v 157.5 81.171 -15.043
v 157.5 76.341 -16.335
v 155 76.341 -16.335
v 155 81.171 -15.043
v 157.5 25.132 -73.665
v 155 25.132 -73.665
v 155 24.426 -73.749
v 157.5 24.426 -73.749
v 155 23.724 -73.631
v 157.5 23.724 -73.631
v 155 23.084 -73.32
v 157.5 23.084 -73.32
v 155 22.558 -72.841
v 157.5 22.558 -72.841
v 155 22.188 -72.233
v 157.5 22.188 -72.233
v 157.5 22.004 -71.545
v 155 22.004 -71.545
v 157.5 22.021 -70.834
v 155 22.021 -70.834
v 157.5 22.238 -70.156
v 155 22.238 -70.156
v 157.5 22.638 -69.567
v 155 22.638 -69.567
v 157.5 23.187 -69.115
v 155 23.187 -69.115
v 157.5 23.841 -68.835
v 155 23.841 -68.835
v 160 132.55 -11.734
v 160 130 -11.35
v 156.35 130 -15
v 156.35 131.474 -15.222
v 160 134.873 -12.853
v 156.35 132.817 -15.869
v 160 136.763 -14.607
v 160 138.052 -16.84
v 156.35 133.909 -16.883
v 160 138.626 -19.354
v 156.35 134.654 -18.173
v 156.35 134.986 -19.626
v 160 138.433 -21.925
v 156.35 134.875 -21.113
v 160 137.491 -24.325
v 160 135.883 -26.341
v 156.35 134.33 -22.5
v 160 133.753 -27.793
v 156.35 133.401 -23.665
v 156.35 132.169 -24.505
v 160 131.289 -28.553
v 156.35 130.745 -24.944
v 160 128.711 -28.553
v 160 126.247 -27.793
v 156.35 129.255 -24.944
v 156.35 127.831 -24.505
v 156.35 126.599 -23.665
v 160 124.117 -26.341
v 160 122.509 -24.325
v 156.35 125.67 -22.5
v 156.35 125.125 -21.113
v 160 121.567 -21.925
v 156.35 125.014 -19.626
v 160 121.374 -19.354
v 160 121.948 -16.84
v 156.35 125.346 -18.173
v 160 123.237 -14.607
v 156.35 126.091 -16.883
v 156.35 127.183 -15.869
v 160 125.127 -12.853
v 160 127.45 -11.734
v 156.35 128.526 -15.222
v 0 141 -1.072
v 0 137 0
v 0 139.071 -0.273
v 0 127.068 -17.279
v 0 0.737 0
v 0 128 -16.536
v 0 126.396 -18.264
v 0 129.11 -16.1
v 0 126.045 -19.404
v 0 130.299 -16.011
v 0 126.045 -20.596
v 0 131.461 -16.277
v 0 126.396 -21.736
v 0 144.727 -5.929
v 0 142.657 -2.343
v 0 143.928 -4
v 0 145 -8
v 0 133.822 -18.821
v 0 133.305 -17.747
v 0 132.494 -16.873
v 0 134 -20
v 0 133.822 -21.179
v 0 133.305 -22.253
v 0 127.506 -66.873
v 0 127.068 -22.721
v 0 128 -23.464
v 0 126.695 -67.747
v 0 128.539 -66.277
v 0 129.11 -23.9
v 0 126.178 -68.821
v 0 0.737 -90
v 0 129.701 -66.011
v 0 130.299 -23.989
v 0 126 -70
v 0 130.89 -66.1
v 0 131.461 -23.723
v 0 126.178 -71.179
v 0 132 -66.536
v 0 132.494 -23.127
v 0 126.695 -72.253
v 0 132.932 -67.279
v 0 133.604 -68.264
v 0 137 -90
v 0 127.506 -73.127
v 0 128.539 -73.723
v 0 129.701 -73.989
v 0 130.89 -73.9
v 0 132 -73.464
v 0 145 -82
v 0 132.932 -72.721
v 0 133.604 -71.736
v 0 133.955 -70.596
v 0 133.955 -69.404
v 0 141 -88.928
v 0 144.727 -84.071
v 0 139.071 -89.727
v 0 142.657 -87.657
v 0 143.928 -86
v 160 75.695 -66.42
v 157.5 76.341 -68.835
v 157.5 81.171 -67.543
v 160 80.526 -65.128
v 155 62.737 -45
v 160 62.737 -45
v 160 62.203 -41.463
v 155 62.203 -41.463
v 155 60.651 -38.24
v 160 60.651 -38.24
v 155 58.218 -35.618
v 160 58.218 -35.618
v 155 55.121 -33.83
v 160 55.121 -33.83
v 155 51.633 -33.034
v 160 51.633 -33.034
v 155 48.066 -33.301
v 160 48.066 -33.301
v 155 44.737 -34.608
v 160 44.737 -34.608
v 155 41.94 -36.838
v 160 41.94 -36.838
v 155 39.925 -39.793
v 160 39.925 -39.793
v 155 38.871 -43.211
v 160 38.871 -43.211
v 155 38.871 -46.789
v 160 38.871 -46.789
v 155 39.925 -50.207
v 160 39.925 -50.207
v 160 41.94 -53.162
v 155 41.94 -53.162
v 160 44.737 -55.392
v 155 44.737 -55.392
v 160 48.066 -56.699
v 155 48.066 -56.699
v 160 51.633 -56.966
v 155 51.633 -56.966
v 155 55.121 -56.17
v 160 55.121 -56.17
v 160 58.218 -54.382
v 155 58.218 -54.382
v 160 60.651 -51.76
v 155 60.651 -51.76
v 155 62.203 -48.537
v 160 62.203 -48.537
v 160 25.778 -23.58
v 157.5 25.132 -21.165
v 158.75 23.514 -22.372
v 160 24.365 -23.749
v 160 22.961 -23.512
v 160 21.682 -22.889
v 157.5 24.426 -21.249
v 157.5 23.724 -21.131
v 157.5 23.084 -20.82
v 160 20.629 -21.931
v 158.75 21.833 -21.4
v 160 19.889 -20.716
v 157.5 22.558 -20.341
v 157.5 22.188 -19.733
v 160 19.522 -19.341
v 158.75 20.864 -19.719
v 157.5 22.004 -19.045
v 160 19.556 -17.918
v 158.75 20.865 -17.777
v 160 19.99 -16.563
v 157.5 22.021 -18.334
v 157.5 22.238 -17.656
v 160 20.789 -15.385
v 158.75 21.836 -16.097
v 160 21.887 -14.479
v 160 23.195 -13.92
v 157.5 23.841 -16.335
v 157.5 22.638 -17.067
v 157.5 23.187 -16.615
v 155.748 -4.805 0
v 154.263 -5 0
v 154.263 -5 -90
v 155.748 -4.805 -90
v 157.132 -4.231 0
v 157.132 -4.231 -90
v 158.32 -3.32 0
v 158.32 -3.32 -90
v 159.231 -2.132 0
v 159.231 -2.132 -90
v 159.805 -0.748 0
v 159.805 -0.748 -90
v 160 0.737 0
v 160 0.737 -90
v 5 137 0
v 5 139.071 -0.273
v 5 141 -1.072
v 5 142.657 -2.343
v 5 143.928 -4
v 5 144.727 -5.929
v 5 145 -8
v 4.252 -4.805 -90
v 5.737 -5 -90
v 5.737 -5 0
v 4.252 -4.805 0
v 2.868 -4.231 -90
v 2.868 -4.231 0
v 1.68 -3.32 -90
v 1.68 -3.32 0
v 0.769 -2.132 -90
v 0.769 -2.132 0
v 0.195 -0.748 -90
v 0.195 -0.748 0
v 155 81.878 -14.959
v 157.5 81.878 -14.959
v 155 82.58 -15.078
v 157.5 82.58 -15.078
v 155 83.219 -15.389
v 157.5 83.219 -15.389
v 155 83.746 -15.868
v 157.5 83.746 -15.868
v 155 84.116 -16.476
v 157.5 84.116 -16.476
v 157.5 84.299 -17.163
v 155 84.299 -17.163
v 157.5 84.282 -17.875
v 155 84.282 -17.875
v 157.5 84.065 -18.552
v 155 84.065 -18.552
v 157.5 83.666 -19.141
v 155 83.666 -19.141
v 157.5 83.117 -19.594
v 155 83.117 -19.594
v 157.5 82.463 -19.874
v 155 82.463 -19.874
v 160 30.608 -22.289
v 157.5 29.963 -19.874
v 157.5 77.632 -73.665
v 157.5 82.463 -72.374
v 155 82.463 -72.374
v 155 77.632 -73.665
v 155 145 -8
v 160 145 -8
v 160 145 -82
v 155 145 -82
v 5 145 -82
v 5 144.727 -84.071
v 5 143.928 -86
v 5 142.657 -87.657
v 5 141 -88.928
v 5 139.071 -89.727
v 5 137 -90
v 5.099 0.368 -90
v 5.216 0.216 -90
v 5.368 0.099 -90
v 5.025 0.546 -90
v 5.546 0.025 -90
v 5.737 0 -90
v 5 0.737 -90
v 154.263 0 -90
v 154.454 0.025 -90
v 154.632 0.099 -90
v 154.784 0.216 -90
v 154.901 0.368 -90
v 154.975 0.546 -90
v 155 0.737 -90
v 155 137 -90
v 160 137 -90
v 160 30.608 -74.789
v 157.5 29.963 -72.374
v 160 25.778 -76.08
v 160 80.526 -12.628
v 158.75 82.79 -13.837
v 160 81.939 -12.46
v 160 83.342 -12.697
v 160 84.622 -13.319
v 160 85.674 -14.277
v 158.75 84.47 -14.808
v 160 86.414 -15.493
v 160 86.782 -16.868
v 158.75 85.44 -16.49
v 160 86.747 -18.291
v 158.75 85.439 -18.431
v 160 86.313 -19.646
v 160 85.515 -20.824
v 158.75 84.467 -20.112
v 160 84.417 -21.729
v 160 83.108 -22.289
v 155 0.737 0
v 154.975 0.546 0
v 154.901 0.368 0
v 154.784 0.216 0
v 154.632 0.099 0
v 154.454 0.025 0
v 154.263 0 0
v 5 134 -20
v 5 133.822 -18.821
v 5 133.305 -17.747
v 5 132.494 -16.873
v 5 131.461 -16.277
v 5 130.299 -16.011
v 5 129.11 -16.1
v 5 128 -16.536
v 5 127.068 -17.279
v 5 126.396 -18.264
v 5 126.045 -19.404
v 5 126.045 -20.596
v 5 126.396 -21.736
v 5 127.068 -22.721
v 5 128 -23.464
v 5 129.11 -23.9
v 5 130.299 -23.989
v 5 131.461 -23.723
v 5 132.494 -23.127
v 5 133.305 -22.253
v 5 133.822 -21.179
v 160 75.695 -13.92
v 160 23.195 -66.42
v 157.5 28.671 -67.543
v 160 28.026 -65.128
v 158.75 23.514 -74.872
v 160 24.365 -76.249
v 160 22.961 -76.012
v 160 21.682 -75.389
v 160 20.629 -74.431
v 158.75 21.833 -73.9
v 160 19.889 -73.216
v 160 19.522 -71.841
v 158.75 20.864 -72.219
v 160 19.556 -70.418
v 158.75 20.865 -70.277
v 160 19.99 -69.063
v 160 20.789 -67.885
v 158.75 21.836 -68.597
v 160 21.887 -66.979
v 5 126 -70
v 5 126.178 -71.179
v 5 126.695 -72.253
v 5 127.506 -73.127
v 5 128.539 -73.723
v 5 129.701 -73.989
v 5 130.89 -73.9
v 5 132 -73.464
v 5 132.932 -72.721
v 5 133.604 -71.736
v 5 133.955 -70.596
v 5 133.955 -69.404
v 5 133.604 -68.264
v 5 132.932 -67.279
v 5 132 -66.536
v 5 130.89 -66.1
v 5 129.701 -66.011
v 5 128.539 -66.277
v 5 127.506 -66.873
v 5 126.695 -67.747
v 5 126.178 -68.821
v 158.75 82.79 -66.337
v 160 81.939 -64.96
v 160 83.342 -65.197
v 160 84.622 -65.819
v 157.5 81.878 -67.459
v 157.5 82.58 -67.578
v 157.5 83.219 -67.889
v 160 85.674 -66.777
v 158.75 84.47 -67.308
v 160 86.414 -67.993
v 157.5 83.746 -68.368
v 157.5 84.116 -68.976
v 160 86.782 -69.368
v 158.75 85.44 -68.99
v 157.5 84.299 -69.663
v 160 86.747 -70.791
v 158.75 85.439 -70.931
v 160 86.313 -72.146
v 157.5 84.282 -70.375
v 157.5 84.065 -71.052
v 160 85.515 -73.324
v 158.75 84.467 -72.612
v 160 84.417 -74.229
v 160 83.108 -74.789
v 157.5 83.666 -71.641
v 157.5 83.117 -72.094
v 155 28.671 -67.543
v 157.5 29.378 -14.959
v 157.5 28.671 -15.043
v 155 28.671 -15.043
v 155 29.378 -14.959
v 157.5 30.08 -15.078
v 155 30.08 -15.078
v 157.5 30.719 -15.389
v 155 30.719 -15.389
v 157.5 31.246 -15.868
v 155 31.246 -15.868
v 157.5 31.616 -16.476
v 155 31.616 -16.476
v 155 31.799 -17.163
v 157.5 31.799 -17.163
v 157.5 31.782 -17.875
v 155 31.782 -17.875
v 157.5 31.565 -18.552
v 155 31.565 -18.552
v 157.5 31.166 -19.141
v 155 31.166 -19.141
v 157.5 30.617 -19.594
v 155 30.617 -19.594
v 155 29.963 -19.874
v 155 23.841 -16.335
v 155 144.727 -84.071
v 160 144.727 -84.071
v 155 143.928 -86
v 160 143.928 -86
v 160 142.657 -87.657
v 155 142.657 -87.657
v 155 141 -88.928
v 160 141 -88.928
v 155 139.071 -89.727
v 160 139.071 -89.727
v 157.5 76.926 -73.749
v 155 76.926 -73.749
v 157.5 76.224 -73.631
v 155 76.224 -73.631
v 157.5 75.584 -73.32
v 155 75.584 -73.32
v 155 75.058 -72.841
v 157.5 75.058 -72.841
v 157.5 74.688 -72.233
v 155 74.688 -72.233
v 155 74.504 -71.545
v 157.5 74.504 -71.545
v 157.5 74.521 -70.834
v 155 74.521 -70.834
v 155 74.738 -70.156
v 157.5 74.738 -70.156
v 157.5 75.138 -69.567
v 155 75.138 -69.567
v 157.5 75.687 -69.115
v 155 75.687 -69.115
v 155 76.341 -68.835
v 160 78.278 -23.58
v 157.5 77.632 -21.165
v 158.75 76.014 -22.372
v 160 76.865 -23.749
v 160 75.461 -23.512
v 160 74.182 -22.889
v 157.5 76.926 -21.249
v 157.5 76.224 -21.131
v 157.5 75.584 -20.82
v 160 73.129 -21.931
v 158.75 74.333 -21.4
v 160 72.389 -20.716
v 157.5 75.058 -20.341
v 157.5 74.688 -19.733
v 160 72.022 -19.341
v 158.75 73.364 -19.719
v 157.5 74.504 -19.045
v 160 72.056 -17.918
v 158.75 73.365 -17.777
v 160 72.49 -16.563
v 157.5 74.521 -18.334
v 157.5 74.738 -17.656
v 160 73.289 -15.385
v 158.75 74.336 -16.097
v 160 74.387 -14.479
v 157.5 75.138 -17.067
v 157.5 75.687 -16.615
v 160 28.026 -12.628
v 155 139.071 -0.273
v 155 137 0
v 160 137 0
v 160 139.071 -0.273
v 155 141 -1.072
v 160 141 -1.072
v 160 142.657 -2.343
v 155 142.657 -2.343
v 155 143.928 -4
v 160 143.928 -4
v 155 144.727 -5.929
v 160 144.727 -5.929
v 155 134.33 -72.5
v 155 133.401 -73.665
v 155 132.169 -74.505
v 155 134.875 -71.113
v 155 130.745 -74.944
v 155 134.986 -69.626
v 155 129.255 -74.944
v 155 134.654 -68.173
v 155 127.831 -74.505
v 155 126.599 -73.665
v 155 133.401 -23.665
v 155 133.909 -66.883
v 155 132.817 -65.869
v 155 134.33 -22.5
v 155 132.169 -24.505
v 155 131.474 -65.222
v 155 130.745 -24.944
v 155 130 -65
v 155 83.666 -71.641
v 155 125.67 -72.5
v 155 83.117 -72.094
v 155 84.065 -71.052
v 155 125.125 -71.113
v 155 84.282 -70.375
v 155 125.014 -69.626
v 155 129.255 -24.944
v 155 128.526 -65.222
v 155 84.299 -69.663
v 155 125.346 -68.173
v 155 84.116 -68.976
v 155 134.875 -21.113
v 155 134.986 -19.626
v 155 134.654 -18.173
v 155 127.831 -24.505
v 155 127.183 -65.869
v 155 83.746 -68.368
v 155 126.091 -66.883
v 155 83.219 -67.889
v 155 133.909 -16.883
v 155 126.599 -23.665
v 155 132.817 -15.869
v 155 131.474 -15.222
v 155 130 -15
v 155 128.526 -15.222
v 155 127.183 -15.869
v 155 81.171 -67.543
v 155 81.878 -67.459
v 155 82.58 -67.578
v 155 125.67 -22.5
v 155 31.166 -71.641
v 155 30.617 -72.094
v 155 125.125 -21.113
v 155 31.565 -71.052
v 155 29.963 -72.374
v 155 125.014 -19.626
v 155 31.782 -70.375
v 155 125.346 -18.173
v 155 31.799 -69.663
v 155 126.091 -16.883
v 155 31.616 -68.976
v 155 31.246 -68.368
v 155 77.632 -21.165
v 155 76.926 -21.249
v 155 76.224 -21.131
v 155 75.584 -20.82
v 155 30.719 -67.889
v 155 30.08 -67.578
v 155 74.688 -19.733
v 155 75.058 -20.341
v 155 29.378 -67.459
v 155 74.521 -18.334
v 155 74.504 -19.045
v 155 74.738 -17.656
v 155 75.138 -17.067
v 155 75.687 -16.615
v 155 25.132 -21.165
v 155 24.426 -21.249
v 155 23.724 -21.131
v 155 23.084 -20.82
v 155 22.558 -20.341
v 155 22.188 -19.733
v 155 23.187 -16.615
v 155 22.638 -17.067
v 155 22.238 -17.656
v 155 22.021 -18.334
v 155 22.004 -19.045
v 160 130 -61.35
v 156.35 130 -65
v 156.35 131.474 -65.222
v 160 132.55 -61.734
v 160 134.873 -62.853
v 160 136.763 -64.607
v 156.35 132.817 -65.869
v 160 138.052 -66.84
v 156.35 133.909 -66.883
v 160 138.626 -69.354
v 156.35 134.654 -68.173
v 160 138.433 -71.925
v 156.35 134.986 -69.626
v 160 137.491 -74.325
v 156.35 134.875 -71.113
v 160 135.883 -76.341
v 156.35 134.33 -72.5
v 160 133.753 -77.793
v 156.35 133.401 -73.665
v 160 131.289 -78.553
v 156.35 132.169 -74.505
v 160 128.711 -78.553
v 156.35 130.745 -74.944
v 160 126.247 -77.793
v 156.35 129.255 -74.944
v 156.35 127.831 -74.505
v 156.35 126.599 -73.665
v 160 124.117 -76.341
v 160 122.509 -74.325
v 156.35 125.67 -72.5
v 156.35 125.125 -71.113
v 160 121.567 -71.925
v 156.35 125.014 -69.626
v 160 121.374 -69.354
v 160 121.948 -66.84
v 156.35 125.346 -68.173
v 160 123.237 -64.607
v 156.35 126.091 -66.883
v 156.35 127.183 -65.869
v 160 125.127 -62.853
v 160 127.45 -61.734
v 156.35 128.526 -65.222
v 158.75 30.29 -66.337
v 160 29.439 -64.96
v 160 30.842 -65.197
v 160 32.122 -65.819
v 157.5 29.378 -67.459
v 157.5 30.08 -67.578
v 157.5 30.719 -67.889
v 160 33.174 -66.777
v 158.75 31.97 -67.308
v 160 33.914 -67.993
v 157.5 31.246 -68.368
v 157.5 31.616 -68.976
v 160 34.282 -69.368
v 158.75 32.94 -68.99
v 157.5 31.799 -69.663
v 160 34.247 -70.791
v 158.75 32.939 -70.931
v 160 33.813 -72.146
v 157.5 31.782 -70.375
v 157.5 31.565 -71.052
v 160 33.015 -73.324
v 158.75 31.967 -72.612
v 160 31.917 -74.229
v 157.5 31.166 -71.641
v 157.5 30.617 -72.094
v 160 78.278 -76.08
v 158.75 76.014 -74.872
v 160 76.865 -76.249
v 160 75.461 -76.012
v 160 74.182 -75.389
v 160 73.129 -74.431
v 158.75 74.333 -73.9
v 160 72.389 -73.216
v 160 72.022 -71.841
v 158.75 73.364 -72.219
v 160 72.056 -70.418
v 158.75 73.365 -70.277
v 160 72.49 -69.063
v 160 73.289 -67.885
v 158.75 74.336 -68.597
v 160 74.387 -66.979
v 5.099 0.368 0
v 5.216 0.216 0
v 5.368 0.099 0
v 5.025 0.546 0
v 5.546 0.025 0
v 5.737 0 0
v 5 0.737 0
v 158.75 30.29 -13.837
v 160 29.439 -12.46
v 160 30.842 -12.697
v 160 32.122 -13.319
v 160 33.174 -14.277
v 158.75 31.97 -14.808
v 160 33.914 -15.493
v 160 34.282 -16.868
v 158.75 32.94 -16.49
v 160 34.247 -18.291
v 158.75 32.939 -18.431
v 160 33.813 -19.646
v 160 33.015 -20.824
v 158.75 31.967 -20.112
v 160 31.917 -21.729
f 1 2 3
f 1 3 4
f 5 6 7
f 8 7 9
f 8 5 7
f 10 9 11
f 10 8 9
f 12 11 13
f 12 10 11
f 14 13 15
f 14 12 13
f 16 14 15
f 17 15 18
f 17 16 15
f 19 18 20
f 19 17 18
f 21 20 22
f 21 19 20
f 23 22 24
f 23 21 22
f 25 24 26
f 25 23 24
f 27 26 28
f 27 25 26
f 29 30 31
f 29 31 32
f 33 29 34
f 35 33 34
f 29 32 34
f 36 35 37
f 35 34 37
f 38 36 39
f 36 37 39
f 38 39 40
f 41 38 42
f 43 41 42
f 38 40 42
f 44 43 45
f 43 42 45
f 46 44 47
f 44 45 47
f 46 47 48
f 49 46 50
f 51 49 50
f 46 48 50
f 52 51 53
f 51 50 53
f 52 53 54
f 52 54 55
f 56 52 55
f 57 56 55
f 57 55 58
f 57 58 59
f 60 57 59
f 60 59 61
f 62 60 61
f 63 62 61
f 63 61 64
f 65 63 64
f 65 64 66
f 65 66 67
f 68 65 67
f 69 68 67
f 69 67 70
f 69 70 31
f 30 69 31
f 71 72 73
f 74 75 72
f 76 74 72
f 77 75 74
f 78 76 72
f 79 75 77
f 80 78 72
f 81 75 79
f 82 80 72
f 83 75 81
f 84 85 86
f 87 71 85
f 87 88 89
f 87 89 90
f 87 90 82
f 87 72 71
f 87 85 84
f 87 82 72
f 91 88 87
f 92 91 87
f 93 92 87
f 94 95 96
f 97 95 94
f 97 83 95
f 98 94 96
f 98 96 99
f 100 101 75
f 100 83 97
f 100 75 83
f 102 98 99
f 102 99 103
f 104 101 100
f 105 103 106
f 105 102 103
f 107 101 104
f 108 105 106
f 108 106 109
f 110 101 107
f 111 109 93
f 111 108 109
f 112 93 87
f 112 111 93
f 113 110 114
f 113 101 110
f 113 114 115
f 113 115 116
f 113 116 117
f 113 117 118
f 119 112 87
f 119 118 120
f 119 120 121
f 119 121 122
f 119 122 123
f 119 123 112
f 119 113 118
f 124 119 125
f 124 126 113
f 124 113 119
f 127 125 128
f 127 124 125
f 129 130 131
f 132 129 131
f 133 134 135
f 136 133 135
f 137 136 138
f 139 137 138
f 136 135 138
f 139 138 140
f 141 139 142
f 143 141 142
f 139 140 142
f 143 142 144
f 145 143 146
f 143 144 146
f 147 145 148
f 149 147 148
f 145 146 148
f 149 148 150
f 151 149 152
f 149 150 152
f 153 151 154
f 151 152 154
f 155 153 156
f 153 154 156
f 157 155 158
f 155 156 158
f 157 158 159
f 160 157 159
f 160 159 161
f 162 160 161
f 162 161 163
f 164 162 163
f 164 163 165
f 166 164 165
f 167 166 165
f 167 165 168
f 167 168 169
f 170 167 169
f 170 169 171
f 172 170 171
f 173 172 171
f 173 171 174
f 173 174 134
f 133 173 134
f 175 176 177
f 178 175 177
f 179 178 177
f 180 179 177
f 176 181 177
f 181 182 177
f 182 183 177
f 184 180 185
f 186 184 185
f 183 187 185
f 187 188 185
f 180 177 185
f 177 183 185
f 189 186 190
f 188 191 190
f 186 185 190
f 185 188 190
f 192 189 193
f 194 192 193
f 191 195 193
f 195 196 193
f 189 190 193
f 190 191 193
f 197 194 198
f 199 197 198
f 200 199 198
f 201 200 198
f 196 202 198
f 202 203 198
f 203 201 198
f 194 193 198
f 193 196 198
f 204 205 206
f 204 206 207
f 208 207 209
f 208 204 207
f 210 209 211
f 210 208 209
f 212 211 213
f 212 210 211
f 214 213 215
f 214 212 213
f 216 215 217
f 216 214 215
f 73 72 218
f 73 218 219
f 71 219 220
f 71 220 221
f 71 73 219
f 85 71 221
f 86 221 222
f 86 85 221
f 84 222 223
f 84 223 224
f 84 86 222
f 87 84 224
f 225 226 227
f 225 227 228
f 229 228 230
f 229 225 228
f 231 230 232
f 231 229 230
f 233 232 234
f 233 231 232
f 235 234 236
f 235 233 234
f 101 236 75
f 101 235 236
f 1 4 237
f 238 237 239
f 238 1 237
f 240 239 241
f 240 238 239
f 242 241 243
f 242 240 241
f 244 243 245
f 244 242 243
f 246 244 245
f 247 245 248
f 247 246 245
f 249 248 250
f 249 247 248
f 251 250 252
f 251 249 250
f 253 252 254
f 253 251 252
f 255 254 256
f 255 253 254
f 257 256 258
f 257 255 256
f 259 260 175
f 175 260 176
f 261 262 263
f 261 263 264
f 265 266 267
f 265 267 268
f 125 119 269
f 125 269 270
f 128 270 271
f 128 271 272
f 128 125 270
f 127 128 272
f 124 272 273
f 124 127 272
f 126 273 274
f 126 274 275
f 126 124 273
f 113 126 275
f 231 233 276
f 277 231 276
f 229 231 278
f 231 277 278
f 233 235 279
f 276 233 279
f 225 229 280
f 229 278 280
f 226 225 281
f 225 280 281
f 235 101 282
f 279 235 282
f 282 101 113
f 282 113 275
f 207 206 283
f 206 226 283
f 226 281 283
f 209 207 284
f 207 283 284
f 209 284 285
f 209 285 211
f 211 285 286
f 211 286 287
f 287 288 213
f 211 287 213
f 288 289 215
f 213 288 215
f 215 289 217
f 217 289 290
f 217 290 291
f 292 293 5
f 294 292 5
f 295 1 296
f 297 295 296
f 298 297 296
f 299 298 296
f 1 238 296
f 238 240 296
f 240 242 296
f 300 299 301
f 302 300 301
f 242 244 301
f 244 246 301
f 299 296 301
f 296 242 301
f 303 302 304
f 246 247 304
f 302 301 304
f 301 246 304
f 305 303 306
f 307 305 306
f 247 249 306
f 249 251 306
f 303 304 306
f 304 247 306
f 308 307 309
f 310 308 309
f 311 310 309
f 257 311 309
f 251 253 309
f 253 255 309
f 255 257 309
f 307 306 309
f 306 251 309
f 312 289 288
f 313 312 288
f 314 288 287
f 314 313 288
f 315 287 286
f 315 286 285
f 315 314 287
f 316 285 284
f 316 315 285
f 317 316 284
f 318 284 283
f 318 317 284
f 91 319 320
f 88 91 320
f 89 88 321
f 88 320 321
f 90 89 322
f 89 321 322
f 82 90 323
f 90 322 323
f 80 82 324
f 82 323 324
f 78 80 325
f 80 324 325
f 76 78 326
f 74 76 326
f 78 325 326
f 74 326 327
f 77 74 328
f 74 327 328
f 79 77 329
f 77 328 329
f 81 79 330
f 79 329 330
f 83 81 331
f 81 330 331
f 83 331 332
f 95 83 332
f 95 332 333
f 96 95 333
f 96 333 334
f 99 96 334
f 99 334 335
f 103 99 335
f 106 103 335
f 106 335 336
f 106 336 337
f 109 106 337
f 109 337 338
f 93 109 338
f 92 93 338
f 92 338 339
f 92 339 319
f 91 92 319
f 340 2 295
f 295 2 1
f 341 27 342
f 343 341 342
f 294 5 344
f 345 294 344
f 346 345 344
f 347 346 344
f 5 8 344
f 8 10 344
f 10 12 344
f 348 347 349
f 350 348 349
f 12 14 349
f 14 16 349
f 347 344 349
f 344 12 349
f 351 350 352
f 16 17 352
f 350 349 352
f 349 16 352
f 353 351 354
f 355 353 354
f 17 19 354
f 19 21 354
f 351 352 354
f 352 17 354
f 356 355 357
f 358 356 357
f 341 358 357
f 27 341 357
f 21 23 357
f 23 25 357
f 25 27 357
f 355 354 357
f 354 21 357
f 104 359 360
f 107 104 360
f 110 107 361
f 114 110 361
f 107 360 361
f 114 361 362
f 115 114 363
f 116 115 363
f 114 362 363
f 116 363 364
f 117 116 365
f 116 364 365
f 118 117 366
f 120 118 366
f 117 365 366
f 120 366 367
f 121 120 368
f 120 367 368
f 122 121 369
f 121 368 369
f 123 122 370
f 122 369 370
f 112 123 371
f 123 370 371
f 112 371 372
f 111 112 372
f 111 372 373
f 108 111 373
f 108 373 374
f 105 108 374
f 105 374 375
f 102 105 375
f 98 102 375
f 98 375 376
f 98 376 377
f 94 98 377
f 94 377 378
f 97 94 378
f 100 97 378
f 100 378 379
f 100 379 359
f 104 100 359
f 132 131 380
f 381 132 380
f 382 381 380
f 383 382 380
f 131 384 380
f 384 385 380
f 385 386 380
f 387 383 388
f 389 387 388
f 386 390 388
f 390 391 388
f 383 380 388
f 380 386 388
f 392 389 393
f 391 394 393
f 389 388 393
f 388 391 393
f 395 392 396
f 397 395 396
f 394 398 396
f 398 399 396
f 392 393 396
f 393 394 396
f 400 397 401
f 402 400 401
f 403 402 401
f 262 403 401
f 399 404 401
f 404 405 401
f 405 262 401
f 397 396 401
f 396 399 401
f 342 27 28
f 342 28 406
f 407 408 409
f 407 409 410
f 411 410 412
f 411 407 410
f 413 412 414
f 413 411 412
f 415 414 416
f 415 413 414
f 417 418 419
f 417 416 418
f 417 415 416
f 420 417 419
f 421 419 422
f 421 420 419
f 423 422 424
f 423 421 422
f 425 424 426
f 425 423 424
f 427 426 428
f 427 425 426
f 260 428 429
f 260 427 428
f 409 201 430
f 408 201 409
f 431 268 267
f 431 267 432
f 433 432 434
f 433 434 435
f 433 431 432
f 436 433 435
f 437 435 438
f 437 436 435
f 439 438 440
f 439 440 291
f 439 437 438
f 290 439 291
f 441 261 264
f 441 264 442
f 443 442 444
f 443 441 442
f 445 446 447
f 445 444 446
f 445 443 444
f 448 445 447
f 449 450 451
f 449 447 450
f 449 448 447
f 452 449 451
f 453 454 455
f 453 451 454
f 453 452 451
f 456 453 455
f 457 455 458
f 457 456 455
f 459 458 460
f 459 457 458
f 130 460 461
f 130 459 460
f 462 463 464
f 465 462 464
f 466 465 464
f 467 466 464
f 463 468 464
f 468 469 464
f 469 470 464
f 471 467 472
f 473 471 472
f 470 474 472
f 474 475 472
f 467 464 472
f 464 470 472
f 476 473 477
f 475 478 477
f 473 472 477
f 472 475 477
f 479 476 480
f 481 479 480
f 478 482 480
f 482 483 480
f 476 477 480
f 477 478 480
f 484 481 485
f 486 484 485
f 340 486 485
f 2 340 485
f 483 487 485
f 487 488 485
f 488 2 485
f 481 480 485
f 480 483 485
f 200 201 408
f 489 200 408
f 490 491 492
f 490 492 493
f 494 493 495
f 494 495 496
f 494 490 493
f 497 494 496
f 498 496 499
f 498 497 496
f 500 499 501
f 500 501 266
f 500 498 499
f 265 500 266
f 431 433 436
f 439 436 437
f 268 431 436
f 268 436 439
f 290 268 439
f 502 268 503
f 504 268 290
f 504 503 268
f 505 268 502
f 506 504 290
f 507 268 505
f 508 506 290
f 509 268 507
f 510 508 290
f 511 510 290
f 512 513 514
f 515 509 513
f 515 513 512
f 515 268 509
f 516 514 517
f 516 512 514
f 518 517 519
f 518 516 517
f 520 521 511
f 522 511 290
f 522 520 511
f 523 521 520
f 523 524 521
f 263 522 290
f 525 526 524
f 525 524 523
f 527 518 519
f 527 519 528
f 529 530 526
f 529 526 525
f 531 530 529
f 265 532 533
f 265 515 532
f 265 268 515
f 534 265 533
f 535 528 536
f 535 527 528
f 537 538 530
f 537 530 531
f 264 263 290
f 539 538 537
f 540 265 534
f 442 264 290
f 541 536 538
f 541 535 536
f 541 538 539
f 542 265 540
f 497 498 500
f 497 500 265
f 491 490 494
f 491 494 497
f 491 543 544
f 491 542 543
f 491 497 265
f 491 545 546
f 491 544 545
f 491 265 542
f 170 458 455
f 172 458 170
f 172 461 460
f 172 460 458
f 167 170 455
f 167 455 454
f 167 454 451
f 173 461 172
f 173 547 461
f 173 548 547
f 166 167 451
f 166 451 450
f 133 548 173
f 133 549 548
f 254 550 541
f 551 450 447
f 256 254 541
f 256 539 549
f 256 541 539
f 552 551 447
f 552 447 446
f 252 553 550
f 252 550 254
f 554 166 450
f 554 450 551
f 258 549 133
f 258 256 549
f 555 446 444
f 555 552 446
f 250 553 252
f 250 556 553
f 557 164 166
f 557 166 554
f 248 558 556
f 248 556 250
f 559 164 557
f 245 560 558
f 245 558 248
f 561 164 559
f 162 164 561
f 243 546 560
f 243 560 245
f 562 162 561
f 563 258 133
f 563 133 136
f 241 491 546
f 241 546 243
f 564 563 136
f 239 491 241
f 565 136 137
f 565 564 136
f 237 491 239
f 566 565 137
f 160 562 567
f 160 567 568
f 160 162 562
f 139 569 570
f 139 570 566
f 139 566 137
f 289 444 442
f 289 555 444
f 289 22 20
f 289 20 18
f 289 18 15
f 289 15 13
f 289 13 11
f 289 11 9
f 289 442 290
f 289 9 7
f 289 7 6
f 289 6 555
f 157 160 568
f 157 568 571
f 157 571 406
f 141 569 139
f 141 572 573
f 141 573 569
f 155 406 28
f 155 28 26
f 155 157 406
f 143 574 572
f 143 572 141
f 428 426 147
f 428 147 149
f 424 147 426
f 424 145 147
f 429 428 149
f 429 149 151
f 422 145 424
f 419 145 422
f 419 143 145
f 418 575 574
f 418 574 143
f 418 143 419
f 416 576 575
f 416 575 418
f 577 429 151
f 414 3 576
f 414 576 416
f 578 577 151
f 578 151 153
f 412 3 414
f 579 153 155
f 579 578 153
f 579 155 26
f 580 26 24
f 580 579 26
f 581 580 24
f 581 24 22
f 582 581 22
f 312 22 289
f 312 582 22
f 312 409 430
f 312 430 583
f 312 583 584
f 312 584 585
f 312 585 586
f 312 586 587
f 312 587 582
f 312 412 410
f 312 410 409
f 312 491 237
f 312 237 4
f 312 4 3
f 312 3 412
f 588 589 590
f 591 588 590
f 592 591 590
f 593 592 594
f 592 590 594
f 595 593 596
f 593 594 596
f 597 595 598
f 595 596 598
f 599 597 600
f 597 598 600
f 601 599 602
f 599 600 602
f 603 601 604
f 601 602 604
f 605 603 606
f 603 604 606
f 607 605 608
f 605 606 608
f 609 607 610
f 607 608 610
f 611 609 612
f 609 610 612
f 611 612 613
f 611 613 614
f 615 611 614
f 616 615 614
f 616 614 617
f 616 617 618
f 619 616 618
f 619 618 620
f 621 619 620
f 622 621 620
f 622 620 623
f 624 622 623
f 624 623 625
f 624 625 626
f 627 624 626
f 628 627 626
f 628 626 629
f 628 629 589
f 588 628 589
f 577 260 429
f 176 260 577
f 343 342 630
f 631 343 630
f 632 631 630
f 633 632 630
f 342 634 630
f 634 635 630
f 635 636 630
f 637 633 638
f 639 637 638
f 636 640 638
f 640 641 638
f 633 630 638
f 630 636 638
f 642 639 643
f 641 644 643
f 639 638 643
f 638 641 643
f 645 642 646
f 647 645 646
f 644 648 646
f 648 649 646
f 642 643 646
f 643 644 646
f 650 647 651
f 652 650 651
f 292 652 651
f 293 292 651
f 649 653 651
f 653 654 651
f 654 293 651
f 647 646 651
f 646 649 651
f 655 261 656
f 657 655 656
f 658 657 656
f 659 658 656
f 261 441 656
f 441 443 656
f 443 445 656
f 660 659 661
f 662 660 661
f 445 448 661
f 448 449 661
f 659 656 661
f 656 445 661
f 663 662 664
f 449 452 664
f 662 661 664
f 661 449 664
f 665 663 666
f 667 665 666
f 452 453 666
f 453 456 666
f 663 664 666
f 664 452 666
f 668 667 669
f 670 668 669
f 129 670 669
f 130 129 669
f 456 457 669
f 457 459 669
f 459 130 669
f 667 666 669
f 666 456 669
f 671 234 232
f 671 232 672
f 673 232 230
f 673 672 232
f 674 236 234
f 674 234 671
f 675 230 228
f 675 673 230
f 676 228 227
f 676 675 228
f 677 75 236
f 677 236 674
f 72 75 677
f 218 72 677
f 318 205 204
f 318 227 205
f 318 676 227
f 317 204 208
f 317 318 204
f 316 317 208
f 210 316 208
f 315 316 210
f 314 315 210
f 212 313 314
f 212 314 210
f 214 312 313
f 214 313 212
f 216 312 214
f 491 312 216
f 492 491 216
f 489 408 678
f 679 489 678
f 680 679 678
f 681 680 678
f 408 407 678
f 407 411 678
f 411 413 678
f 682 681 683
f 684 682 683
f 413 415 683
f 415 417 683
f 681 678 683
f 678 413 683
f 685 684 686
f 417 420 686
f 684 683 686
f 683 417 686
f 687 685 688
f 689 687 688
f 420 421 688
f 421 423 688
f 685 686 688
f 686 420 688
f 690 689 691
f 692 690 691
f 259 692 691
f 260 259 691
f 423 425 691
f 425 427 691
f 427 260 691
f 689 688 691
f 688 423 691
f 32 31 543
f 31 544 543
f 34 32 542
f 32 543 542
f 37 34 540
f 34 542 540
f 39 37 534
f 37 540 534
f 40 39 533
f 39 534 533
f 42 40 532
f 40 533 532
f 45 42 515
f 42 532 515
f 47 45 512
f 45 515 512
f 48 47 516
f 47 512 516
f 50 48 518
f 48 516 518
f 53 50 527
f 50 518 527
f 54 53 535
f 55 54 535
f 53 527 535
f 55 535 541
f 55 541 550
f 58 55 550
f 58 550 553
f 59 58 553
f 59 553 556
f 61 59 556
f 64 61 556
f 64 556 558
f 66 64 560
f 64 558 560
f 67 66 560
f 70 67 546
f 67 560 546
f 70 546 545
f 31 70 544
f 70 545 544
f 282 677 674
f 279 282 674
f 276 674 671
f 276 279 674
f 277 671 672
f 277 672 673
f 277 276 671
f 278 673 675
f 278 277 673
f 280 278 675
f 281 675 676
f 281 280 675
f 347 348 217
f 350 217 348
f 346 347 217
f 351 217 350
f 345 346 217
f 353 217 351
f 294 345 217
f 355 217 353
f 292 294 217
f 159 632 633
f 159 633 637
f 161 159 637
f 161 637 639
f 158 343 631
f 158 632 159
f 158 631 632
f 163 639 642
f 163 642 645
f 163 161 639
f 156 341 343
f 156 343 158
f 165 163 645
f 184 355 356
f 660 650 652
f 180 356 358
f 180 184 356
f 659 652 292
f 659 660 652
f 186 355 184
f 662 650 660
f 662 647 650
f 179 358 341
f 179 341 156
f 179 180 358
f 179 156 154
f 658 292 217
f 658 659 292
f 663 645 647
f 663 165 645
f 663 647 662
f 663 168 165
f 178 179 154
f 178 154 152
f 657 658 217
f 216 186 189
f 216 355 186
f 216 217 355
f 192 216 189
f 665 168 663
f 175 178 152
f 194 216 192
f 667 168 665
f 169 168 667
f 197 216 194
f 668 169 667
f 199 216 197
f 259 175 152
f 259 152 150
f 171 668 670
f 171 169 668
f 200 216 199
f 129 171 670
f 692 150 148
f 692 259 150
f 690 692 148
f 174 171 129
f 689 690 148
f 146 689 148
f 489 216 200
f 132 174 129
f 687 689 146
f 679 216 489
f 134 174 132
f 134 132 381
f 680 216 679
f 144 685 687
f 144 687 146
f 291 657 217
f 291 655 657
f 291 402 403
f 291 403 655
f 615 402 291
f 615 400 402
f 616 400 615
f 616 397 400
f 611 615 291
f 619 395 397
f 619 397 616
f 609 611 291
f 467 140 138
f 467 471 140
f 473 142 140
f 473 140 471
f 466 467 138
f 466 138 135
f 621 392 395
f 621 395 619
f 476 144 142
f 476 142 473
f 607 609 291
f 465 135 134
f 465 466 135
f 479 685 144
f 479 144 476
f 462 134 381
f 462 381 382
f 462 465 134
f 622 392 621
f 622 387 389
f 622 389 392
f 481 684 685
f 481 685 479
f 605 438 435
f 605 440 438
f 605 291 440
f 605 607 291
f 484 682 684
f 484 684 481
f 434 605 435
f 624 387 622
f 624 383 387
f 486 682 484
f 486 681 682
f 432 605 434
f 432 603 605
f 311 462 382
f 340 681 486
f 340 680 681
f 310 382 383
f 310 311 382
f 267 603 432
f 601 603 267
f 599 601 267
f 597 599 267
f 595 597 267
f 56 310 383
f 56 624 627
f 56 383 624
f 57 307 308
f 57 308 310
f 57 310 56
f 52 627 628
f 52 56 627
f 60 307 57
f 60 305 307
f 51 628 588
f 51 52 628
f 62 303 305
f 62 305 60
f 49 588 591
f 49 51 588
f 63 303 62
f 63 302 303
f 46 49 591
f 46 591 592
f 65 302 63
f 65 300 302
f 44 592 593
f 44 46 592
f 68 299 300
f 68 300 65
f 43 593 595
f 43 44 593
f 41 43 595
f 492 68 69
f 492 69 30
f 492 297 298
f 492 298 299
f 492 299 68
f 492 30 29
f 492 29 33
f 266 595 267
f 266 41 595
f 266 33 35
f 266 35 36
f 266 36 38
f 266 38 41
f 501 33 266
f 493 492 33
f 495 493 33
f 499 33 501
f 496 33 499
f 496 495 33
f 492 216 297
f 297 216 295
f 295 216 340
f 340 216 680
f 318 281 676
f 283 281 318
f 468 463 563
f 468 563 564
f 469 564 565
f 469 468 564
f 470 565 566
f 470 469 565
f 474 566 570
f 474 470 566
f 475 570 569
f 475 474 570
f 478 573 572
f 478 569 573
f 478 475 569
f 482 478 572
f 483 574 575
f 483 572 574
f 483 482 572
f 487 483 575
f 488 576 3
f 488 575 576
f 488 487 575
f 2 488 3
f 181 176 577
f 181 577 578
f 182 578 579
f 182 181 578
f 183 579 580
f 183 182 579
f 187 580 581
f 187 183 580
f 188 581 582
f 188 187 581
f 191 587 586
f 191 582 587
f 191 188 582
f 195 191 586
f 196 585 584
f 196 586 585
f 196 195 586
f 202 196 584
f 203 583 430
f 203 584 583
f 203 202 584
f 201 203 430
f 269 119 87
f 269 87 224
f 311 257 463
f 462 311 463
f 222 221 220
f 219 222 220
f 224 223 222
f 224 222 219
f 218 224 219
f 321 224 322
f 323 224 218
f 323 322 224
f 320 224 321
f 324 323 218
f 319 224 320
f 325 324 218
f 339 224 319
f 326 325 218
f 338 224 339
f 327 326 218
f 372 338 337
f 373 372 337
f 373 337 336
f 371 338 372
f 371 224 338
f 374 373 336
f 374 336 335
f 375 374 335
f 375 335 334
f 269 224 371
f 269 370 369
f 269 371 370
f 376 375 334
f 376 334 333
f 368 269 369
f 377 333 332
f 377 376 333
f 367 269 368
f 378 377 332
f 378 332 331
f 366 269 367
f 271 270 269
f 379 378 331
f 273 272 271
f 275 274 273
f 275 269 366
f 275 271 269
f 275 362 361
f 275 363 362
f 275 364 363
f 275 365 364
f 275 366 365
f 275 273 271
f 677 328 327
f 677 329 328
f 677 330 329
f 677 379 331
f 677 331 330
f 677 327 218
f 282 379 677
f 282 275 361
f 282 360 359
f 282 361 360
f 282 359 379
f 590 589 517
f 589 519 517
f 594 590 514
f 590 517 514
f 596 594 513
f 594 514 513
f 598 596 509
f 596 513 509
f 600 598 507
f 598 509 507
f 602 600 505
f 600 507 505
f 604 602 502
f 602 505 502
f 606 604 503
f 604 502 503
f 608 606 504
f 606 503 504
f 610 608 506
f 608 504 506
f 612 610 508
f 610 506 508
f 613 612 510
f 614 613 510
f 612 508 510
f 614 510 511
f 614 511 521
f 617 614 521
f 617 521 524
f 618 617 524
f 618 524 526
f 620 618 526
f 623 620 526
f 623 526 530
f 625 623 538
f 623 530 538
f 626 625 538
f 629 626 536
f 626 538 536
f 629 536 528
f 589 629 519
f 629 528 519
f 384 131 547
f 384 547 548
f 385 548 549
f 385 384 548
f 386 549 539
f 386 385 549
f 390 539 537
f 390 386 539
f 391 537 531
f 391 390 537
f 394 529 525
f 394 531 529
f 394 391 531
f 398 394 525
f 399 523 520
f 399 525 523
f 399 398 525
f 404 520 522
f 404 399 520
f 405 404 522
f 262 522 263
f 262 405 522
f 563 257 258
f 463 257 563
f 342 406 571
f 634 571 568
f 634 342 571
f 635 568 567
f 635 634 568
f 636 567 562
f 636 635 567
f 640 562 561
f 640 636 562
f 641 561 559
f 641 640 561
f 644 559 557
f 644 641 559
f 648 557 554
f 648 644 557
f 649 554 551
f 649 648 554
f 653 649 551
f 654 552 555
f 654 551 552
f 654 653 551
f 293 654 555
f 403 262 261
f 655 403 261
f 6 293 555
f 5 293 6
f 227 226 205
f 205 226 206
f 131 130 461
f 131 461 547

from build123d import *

# Parameters (mm, degrees)
SKETCH5_W                                       = 160
SKETCH5_H                                       = 90
BASE_FLANGE1_DEPTH                              = 5
EDGE_FLANGE1_STRIP_W                            = 21.4732
EDGE_FLANGE1_STRIP_H                            = 5
EDGE_FLANGE1_STRIP_CUT_DEPTH                    = 90
EDGE_FLANGE1_STRIP_2_W                          = 21.4732
EDGE_FLANGE1_STRIP_2_H                          = 5
EDGE_FLANGE1_STRIP_CUT_2_DEPTH                  = 90
EDGE_FLANGE1_DEPTH                              = 90
EDGE_FLANGE1_BEND_DEPTH                         = 90
CUT_EXTRUDE1_REACH                              = 235.934
SKETCH16_R                                      = 12
SKETCH16_R_2                                    = 4
CUT_EXTRUDE2_REACH                              = 232.543
SKETCH20_R                                      = 4
CSK_FOR_M8_FLAT_HEAD_MACHINE_SCREW1_D           = 10
CSK_FOR_M8_FLAT_HEAD_MACHINE_SCREW1_DEPTH       = 10.25
CSK_FOR_M8_FLAT_HEAD_MACHINE_SCREW1_CSINK_D     = 17.3
CSK_FOR_M8_FLAT_HEAD_MACHINE_SCREW1_CSINK_ANGLE = 90
CSK_FOR_M8_FLAT_HEAD_MACHINE_SCREW1_TIP         = 3.004303095
BREAK_CORNER1_DEPTH                             = 160
CHAMFER2_SIZE                                   = 2.5


# Read off the part's stored shape, not the designer's step: Break-Corner1
# Sheet-metal steps are written as plain solids
with BuildPart() as part:
    # Sketch5 → Base-Flange1 (new body)
    with BuildSketch(Plane(origin=(0, 0, 0), x_dir=(1, 0, 0), z_dir=(0, 1, 0))):
        with Locations((80, 45)):
            Rectangle(SKETCH5_W, SKETCH5_H)
    extrude(amount=-BASE_FLANGE1_DEPTH)

    # Edge-Flange1 strip (across the edge) → Edge-Flange1 strip cut (cut)
    with BuildSketch(Plane.XY.offset(-90)):
        with Locations((-5, -2.5)):
            Rectangle(EDGE_FLANGE1_STRIP_W, EDGE_FLANGE1_STRIP_H)
    extrude(amount=EDGE_FLANGE1_STRIP_CUT_DEPTH, mode=Mode.SUBTRACT)

    # Edge-Flange1 strip 2 (across the edge) → Edge-Flange1 strip cut 2 (cut)
    with BuildSketch(Plane(origin=(160, 0, 0), x_dir=(-1, 0, 0), z_dir=(0, 0, -1))):
        with Locations((-5, -2.5)):
            Rectangle(EDGE_FLANGE1_STRIP_2_W, EDGE_FLANGE1_STRIP_2_H)
    extrude(amount=EDGE_FLANGE1_STRIP_CUT_2_DEPTH, mode=Mode.SUBTRACT)

    # Edge-Flange1 section (across the edge) → Edge-Flange1 (add)
    with BuildSketch(Plane.XY.offset(-90)):
        with BuildLine():
            Line((0, 0.7366), (0, 145))
            Line((0, 145), (5, 145))
            Line((5, 145), (5, 0.7366))
            ThreePointArc((5, 0.7366), (5.215745145, 0.215745145), (5.7366, 0))
            Line((5.7366, 0), (5.7366, -5))
            ThreePointArc((5.7366, -5), (1.680211239, -3.319788761), (0, 0.7366))
        make_face()
    extrude(amount=EDGE_FLANGE1_DEPTH)

    # Edge-Flange1 section 2 (across the edge) → Edge-Flange1 bend (add)
    with BuildSketch(Plane(origin=(160, 0, 0), x_dir=(-1, 0, 0), z_dir=(0, 0, -1))):
        with BuildLine():
            Line((0, 0.7366), (0, 145))
            Line((0, 145), (5, 145))
            Line((5, 145), (5, 0.7366))
            ThreePointArc((5, 0.7366), (5.215745145, 0.215745145), (5.7366, 0))
            Line((5.7366, 0), (5.7366, -5))
            ThreePointArc((5.7366, -5), (1.680211239, -3.319788761), (0, 0.7366))
        make_face()
    extrude(amount=EDGE_FLANGE1_BEND_DEPTH)

    # Sketch16 → Cut-Extrude1 (cut, up to next)
    with BuildSketch(Plane(origin=(160, 0, 0), x_dir=(0, 0, -1), z_dir=(1, 0, 0)), mode=Mode.PRIVATE) as cut_extrude1_sk1:
        with Locations(Location((45, 50.7366, 0), (0, 0, 90))):
            Circle(SKETCH16_R)
    cut_extrude1_tool1 = extrude(cut_extrude1_sk1.sketch, amount=-CUT_EXTRUDE1_REACH, mode=Mode.PRIVATE) & part.part
    # Sketch16 → Cut-Extrude1 (cut, up to next)
    with BuildSketch(Plane(origin=(160, 0, 0), x_dir=(0, 0, -1), z_dir=(1, 0, 0)), mode=Mode.PRIVATE) as cut_extrude1_sk2:
        with Locations(Location((20, 130, 0), (0, 0, 90))):
            Circle(SKETCH16_R_2)
    cut_extrude1_tool2 = extrude(cut_extrude1_sk2.sketch, amount=-CUT_EXTRUDE1_REACH, mode=Mode.PRIVATE) & part.part
    # Sketch16 → Cut-Extrude1 (cut, up to next)
    with BuildSketch(Plane(origin=(160, 0, 0), x_dir=(0, 0, -1), z_dir=(1, 0, 0)), mode=Mode.PRIVATE) as cut_extrude1_sk3:
        with Locations(Location((70, 130, 0), (0, 0, 270))):
            Circle(SKETCH16_R_2)
    cut_extrude1_tool3 = extrude(cut_extrude1_sk3.sketch, amount=-CUT_EXTRUDE1_REACH, mode=Mode.PRIVATE) & part.part
    # Sketch16 → Cut-Extrude1 (cut, up to next)
    with BuildSketch(Plane(origin=(160, 0, 0), x_dir=(0, 0, -1), z_dir=(1, 0, 0)), mode=Mode.PRIVATE) as cut_extrude1_sk4:
        with BuildLine():
            Line((16.334822748, 23.840907472), (15.043437692, 28.671261976))
            ThreePointArc((15.043437692, 28.671261976), (16.812922416, 31.732131756), (19.873792196, 29.962647032))
            Line((19.873792196, 29.962647032), (21.165177252, 25.132292528))
            ThreePointArc((21.165177252, 25.132292528), (19.395692528, 22.071422748), (16.334822748, 23.840907472))
        make_face()
    cut_extrude1_tool4 = extrude(cut_extrude1_sk4.sketch, amount=-CUT_EXTRUDE1_REACH, mode=Mode.PRIVATE) & part.part
    # Sketch16 → Cut-Extrude1 (cut, up to next)
    with BuildSketch(Plane(origin=(160, 0, 0), x_dir=(0, 0, -1), z_dir=(1, 0, 0)), mode=Mode.PRIVATE) as cut_extrude1_sk5:
        with BuildLine():
            Line((68.834822748, 23.840907472), (67.543437692, 28.671261976))
            ThreePointArc((67.543437692, 28.671261976), (69.312922416, 31.732131756), (72.373792196, 29.962647032))
            Line((72.373792196, 29.962647032), (73.665177252, 25.132292528))
            ThreePointArc((73.665177252, 25.132292528), (71.895692528, 22.071422748), (68.834822748, 23.840907472))
        make_face()
    cut_extrude1_tool5 = extrude(cut_extrude1_sk5.sketch, amount=-CUT_EXTRUDE1_REACH, mode=Mode.PRIVATE) & part.part
    # Sketch16 → Cut-Extrude1 (cut, up to next)
    with BuildSketch(Plane(origin=(160, 0, 0), x_dir=(0, 0, -1), z_dir=(1, 0, 0)), mode=Mode.PRIVATE) as cut_extrude1_sk6:
        with BuildLine():
            Line((16.334822748, 76.340907472), (15.043437692, 81.171261976))
            ThreePointArc((15.043437692, 81.171261976), (16.812922416, 84.232131756), (19.873792196, 82.462647032))
            Line((19.873792196, 82.462647032), (21.165177252, 77.632292528))
            ThreePointArc((21.165177252, 77.632292528), (19.395692528, 74.571422748), (16.334822748, 76.340907472))
        make_face()
    cut_extrude1_tool6 = extrude(cut_extrude1_sk6.sketch, amount=-CUT_EXTRUDE1_REACH, mode=Mode.PRIVATE) & part.part
    # Sketch16 → Cut-Extrude1 (cut, up to next)
    with BuildSketch(Plane(origin=(160, 0, 0), x_dir=(0, 0, -1), z_dir=(1, 0, 0)), mode=Mode.PRIVATE) as cut_extrude1_sk7:
        with BuildLine():
            Line((68.834822748, 76.340907472), (67.543437692, 81.171261976))
            ThreePointArc((67.543437692, 81.171261976), (69.312922416, 84.232131756), (72.373792196, 82.462647032))
            Line((72.373792196, 82.462647032), (73.665177252, 77.632292528))
            ThreePointArc((73.665177252, 77.632292528), (71.895692528, 74.571422748), (68.834822748, 76.340907472))
        make_face()
    cut_extrude1_tool7 = extrude(cut_extrude1_sk7.sketch, amount=-CUT_EXTRUDE1_REACH, mode=Mode.PRIVATE) & part.part
    add(cut_extrude1_tool1.solids().sort_by_distance((160, 50.7366, -45))[0], mode=Mode.SUBTRACT)
    add(cut_extrude1_tool2.solids().sort_by_distance((160, 130, -20))[0], mode=Mode.SUBTRACT)
    add(cut_extrude1_tool3.solids().sort_by_distance((160, 130, -70))[0], mode=Mode.SUBTRACT)
    add(cut_extrude1_tool4.solids().sort_by_distance((160, 26.901777, -18.104307))[0], mode=Mode.SUBTRACT)
    add(cut_extrude1_tool5.solids().sort_by_distance((160, 26.901777, -70.604307))[0], mode=Mode.SUBTRACT)
    add(cut_extrude1_tool6.solids().sort_by_distance((160, 79.401777, -18.104307))[0], mode=Mode.SUBTRACT)
    add(cut_extrude1_tool7.solids().sort_by_distance((160, 79.401777, -70.604307))[0], mode=Mode.SUBTRACT)

    # Sketch20 → Cut-Extrude2 (cut, up to next)
    with BuildSketch(Plane(origin=(5, 0, 0), x_dir=(0, 0, -1), z_dir=(1, 0, 0)), mode=Mode.PRIVATE) as cut_extrude2_sk1:
        with Locations(Location((70, 130, 0), (0, 0, 270))):
            Circle(SKETCH20_R)
    cut_extrude2_tool1 = extrude(cut_extrude2_sk1.sketch, amount=-CUT_EXTRUDE2_REACH, mode=Mode.PRIVATE) & part.part
    # Sketch20 → Cut-Extrude2 (cut, up to next)
    with BuildSketch(Plane(origin=(5, 0, 0), x_dir=(0, 0, -1), z_dir=(1, 0, 0)), mode=Mode.PRIVATE) as cut_extrude2_sk2:
        with Locations(Location((20, 130, 0), (0, 0, 90))):
            Circle(SKETCH20_R)
    cut_extrude2_tool2 = extrude(cut_extrude2_sk2.sketch, amount=-CUT_EXTRUDE2_REACH, mode=Mode.PRIVATE) & part.part
    add(cut_extrude2_tool1.solids().sort_by_distance((5, 130, -70))[0], mode=Mode.SUBTRACT)
    add(cut_extrude2_tool2.solids().sort_by_distance((5, 130, -20))[0], mode=Mode.SUBTRACT)

    # CSK for M8 Flat Head Machine Screw1
    with Locations(Plane(origin=(160, 0, 0), x_dir=(0, 0, -1), z_dir=(1, 0, 0))):
        with Locations((20, 130), (70, 130)):
            CounterSinkHole(CSK_FOR_M8_FLAT_HEAD_MACHINE_SCREW1_D / 2, CSK_FOR_M8_FLAT_HEAD_MACHINE_SCREW1_CSINK_D / 2, depth=CSK_FOR_M8_FLAT_HEAD_MACHINE_SCREW1_DEPTH, counter_sink_angle=CSK_FOR_M8_FLAT_HEAD_MACHINE_SCREW1_CSINK_ANGLE)
            with Locations((0, 0, -(CSK_FOR_M8_FLAT_HEAD_MACHINE_SCREW1_DEPTH + CSK_FOR_M8_FLAT_HEAD_MACHINE_SCREW1_TIP / 2))):  # 118° drill point
                Cone(0, CSK_FOR_M8_FLAT_HEAD_MACHINE_SCREW1_D / 2, CSK_FOR_M8_FLAT_HEAD_MACHINE_SCREW1_TIP, mode=Mode.SUBTRACT)

    # Break-Corner1 outline → Break-Corner1 (cut)
    with BuildSketch(Plane.YZ):
        with BuildLine():
            Line((145, -90), (145, -82))
            ThreePointArc((145, -82), (142.656854249, -87.656854249), (137, -90))
            Line((137, -90), (145, -90))
        make_face()
        with BuildLine():
            ThreePointArc((137, 0), (142.656854249, -2.343145751), (145, -8))
            Line((145, -8), (145, 0))
            Line((145, 0), (137, 0))
        make_face()
    extrude(amount=BREAK_CORNER1_DEPTH, mode=Mode.SUBTRACT)

    # Chamfer2
    chamfer2_edges = [part.edges().sort_by_distance(p)[0] for p in [
        (160, 22.071422748, -19.395692528),
        (160, 27.54746978, -20.519484724),
        (160, 31.732131756, -16.812922416),
        (160, 26.256084724, -15.68913022),
        (160, 22.071422748, -71.895692528),
        (160, 27.54746978, -73.019484724),
        (160, 31.732131756, -69.312922416),
        (160, 26.256084724, -68.18913022),
        (160, 74.571422748, -19.395692528),
        (160, 80.04746978, -20.519484724),
        (160, 84.232131756, -16.812922416),
        (160, 78.756084724, -15.68913022),
        (160, 74.571422748, -71.895692528),
        (160, 80.04746978, -73.019484724),
        (160, 84.232131756, -69.312922416),
        (160, 78.756084724, -68.18913022),
    ]]
    chamfer(chamfer2_edges, length=CHAMFER2_SIZE)


solid = part.part
